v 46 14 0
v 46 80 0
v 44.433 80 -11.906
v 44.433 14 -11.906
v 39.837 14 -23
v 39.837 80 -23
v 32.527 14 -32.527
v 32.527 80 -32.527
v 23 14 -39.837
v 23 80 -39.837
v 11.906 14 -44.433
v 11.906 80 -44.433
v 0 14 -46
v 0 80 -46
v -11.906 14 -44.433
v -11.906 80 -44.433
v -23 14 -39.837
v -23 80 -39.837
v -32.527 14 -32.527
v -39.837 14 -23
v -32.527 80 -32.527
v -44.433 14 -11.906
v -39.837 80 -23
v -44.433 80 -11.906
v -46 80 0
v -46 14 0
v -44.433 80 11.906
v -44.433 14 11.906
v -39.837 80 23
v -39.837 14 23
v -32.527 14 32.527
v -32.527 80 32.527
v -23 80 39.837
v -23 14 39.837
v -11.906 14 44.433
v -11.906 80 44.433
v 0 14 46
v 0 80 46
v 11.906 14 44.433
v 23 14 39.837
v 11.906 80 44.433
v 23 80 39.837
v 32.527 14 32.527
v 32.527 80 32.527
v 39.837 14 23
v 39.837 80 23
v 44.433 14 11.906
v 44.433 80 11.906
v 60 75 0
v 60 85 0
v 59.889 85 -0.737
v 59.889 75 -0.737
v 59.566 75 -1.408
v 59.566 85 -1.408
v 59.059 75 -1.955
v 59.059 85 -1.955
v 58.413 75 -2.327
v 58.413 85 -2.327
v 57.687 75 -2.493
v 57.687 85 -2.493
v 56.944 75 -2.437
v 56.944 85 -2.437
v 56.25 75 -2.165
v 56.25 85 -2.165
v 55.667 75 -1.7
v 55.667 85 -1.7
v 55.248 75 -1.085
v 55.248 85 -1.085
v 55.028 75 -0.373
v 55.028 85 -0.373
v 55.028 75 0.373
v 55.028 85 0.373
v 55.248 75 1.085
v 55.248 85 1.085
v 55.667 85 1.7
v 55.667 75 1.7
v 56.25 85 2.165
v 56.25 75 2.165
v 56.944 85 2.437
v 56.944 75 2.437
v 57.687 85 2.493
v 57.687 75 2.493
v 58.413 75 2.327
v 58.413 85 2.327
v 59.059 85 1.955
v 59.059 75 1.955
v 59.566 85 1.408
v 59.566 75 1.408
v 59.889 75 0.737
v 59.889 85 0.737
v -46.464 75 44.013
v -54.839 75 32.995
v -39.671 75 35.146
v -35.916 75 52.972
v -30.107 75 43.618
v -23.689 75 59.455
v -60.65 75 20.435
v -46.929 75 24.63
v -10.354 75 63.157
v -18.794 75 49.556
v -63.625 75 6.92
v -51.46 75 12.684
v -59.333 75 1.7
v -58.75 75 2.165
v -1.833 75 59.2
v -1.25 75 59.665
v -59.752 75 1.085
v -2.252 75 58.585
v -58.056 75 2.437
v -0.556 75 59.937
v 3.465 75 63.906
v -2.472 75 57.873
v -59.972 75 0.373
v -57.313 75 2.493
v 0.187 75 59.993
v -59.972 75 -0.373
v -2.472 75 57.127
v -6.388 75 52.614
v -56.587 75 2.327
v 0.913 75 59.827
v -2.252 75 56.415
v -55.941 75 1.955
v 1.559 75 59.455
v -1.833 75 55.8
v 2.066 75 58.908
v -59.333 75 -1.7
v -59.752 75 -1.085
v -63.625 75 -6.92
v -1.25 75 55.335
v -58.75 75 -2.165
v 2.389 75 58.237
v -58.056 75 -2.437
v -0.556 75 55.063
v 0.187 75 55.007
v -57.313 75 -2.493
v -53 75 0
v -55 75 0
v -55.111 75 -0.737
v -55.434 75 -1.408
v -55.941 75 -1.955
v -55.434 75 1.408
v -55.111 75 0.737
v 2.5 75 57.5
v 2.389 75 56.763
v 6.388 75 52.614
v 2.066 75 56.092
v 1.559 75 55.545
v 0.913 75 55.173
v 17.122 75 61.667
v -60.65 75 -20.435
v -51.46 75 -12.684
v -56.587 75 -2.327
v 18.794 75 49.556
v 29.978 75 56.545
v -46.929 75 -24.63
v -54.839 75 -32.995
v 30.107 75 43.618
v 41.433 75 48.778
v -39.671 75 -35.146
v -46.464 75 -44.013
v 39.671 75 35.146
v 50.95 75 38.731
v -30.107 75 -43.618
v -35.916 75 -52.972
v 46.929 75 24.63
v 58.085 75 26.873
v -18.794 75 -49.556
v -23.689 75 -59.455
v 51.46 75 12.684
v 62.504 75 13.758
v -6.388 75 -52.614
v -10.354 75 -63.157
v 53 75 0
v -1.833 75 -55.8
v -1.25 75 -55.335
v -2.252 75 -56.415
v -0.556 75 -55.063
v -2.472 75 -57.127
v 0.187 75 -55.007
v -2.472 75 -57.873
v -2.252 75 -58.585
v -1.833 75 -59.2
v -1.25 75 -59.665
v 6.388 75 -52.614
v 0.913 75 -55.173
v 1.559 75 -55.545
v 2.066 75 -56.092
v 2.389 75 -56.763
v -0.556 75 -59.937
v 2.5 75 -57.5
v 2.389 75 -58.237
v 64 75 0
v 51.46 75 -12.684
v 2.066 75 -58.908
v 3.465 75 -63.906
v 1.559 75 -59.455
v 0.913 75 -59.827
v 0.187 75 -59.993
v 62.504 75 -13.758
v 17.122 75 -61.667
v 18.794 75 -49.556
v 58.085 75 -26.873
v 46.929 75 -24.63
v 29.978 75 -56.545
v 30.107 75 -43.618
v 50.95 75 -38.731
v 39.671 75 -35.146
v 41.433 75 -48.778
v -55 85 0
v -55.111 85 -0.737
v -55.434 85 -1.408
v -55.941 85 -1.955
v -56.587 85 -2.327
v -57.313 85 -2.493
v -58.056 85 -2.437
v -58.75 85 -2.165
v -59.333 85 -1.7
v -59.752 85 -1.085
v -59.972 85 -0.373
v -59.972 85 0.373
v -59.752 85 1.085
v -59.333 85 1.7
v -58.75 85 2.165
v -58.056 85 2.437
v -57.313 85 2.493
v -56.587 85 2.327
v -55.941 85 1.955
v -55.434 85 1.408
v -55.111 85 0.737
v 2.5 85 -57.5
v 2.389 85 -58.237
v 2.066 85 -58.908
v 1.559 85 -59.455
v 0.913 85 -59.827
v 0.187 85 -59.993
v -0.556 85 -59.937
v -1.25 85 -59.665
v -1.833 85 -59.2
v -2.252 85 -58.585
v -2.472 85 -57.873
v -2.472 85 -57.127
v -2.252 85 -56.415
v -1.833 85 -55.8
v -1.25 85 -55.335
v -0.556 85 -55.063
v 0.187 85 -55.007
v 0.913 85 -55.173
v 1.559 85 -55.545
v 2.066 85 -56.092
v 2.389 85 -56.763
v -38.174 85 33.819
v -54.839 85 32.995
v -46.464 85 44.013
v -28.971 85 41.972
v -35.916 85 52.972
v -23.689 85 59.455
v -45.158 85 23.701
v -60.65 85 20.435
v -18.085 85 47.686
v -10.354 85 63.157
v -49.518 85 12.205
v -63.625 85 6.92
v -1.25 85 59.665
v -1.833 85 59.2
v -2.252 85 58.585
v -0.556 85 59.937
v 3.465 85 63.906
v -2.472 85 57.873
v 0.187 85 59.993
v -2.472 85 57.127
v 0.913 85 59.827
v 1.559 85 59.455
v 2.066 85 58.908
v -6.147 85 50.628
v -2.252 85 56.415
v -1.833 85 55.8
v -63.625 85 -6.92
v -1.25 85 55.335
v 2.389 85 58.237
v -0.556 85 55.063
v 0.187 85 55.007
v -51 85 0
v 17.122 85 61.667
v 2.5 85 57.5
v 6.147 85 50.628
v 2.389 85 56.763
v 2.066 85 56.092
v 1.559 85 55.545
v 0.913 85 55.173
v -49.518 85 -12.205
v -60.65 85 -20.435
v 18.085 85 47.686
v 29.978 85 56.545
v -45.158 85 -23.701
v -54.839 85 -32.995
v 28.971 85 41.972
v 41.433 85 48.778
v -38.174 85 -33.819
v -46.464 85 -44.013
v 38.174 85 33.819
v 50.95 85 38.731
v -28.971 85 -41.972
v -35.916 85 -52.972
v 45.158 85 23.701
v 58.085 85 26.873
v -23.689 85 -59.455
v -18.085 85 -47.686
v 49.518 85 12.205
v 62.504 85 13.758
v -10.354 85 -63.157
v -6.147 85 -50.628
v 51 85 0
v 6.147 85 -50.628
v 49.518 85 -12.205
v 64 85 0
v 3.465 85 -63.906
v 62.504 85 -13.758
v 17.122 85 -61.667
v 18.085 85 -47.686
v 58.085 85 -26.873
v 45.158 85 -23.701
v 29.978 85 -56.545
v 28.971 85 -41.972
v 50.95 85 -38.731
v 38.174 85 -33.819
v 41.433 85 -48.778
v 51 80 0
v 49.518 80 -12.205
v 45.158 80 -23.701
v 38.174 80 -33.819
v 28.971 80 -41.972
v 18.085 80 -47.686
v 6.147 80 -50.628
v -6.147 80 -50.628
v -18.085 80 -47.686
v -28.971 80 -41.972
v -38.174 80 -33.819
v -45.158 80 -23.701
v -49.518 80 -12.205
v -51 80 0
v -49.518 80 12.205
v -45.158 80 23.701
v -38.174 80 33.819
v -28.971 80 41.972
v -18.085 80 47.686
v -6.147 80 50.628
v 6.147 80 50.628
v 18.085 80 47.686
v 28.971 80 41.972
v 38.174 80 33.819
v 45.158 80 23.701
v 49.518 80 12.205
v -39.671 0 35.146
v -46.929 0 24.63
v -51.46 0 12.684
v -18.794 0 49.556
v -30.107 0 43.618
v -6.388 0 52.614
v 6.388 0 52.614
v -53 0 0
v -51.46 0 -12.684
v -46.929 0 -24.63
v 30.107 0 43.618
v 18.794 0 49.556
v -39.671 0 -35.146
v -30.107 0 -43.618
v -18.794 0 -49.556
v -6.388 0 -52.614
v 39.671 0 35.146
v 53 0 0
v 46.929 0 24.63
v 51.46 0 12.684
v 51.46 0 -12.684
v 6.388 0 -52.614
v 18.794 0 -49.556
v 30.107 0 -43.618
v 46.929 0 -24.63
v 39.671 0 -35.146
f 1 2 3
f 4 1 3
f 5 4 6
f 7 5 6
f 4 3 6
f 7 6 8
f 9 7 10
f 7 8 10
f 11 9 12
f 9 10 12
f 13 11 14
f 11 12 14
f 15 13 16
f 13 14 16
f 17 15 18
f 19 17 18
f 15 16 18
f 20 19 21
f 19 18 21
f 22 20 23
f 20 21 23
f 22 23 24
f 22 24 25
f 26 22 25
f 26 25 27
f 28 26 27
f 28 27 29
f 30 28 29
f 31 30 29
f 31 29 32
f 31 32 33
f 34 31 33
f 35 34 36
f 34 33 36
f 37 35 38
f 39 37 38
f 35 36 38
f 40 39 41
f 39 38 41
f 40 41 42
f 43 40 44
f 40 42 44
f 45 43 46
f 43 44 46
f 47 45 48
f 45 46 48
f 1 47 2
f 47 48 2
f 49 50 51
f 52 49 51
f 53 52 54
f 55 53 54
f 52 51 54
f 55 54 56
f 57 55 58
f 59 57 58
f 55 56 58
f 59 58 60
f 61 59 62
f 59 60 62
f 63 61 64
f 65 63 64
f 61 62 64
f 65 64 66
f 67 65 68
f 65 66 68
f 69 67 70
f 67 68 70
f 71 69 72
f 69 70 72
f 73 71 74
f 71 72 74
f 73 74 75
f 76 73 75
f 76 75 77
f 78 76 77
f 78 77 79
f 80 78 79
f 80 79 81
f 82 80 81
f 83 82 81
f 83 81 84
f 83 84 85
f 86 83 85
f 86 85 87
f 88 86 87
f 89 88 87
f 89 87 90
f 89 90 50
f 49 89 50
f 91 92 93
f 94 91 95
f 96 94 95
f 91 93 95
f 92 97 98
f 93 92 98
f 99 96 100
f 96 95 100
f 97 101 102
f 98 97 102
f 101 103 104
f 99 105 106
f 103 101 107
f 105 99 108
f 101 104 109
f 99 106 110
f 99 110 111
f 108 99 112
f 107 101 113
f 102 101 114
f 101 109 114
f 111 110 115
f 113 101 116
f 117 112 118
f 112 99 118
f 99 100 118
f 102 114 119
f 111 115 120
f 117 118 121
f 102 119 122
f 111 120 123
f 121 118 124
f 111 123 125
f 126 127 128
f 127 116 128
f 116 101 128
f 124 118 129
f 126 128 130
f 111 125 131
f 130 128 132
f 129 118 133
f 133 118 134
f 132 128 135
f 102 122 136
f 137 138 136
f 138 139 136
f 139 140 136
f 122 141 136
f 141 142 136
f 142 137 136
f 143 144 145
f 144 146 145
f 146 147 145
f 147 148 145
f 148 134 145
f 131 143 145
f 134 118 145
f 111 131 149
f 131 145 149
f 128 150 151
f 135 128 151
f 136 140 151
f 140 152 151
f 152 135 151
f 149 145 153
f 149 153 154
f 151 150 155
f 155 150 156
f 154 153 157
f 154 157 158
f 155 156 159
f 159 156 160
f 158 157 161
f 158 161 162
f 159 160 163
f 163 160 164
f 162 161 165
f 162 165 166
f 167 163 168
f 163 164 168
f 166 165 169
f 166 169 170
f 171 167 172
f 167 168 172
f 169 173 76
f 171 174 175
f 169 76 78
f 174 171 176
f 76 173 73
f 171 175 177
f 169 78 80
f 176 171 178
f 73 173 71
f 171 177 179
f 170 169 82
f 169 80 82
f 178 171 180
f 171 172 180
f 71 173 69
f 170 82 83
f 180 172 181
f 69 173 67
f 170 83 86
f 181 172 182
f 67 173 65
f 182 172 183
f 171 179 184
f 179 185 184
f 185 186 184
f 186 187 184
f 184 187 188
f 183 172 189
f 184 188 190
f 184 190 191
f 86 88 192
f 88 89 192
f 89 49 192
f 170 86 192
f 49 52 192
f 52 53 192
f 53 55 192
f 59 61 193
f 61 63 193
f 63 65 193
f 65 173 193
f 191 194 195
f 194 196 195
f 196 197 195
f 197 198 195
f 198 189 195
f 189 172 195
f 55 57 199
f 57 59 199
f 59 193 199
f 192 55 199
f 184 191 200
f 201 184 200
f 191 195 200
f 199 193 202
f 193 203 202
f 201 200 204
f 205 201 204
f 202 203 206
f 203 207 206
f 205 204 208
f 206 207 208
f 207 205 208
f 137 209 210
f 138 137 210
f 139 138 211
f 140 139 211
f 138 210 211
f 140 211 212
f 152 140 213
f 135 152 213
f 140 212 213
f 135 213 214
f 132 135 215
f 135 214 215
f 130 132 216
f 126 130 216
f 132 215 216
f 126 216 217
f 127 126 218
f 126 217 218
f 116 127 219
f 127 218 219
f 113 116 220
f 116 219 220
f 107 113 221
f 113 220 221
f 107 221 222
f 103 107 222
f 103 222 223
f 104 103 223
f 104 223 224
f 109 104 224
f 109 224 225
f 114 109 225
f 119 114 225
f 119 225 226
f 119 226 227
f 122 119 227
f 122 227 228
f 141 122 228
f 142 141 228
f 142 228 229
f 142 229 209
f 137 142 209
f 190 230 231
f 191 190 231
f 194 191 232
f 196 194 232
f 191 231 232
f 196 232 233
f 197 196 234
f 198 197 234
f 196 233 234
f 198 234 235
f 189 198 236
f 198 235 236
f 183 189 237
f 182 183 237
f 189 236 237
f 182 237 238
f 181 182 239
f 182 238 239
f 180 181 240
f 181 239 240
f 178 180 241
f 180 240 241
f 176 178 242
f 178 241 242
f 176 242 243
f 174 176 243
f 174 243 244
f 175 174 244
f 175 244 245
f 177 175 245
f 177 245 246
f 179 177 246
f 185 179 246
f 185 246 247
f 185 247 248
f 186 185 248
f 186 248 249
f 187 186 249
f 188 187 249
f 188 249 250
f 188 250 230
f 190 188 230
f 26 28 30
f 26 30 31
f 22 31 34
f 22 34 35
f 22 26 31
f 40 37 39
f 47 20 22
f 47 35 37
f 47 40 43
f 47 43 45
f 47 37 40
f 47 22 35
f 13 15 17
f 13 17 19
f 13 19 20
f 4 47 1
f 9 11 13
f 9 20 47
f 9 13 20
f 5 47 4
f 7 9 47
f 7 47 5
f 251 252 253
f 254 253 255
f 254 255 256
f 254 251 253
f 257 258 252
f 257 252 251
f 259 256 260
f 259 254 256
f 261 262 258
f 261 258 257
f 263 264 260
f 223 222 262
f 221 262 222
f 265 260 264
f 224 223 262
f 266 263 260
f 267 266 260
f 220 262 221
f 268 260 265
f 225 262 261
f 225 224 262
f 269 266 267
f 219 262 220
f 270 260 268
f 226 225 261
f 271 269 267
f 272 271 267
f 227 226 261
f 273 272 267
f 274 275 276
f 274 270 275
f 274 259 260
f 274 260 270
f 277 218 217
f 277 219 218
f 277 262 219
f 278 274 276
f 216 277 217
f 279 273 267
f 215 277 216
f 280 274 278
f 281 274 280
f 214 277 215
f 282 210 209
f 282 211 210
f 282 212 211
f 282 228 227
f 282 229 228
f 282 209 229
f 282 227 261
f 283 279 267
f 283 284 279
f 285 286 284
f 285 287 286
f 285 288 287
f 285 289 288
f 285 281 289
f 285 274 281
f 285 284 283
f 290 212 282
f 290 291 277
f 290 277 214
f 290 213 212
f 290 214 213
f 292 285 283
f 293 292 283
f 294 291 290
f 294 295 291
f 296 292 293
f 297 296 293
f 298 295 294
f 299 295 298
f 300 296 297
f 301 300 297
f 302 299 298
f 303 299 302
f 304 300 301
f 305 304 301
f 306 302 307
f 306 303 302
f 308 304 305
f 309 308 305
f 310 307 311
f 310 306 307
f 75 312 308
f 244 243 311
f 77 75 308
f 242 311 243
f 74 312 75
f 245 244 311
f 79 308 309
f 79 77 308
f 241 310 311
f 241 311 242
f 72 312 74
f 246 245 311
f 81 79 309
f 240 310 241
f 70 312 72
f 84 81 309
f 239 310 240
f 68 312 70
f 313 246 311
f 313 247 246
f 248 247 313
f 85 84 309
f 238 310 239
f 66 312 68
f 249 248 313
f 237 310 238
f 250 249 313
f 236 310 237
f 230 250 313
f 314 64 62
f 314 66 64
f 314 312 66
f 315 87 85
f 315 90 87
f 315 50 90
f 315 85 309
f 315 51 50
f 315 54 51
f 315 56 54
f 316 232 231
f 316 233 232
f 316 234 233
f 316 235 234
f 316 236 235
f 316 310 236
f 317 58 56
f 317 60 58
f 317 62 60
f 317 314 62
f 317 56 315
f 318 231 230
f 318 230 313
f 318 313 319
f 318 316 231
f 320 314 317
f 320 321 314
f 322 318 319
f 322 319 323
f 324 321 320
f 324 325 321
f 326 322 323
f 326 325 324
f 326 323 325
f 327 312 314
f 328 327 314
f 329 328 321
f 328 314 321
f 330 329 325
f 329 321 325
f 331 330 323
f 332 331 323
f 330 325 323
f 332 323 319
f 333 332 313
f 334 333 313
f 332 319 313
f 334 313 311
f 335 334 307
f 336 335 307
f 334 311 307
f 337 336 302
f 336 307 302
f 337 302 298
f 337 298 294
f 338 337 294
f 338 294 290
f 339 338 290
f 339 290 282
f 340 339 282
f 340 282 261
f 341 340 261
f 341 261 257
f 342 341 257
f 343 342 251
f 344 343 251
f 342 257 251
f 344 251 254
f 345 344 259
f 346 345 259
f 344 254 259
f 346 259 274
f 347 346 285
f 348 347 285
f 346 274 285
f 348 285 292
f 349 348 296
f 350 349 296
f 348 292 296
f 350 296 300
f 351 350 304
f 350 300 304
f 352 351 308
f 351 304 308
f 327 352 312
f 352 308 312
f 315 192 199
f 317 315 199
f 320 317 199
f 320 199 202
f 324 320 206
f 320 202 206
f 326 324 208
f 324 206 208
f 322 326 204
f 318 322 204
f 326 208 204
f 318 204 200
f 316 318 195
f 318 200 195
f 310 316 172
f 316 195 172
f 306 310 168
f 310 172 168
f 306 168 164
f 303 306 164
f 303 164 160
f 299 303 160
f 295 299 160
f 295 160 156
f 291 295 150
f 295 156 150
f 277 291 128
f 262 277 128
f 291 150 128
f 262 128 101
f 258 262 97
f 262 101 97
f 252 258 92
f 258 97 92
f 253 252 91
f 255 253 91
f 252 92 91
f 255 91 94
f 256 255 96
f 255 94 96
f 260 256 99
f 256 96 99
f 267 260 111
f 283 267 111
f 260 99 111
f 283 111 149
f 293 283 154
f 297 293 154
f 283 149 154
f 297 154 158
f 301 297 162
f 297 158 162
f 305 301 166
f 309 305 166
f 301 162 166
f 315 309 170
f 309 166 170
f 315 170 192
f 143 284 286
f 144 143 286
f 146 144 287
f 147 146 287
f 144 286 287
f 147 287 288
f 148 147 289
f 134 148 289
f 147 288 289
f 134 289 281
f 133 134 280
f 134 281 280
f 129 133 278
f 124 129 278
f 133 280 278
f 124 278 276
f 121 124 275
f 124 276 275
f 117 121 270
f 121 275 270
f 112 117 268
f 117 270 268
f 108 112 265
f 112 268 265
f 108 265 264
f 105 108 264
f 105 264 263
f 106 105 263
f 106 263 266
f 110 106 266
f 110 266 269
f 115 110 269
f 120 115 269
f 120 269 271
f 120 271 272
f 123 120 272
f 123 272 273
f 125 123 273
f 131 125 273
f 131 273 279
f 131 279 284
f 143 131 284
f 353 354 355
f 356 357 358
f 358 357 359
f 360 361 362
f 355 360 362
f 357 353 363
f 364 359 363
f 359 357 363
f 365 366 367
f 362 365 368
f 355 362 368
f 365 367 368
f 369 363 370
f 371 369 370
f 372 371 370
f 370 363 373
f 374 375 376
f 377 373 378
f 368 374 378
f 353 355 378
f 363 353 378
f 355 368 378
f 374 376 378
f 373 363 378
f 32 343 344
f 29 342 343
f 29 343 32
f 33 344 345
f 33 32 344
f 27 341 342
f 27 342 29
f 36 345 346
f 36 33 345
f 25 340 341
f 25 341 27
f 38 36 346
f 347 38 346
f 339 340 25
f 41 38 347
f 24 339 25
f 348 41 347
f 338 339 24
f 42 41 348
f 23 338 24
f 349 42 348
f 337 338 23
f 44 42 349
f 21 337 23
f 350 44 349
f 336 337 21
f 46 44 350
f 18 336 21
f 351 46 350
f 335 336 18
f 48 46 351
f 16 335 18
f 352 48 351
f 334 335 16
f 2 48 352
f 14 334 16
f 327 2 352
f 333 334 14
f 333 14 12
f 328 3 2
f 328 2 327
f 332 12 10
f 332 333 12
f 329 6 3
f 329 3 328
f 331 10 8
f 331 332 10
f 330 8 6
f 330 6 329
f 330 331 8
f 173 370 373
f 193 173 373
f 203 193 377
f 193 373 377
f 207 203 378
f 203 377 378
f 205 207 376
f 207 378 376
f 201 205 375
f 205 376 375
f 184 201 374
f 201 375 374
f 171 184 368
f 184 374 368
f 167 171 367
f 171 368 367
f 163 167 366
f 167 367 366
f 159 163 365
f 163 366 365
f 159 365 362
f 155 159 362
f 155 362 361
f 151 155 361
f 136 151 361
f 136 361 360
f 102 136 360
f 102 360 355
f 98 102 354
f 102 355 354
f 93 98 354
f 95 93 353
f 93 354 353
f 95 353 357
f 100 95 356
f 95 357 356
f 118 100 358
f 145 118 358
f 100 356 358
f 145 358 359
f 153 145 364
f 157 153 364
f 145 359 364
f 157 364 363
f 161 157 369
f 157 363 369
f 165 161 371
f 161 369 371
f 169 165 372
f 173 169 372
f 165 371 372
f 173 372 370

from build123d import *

# Parameters (mm, degrees)
SKETCH1_R           = 53
BOSS_EXTRUDE1_DEPTH = 75
SKETCH2_R           = 64
BOSS_EXTRUDE2_DEPTH = 10
SKETCH3_R           = 51
CUT_EXTRUDE1_DEPTH  = 5
SKETCH5_R           = 46
CUT_EXTRUDE2_DEPTH  = 66
SKETCH6_R           = 2.5
CUT_EXTRUDE3_DEPTH  = 66


with BuildPart() as part:
    # Sketch1 → Boss-Extrude1 (new body)
    with BuildSketch(Plane(origin=(0, 0, 0), x_dir=(1, 0, 0), z_dir=(0, 1, 0))):
        Circle(SKETCH1_R)
    extrude(amount=BOSS_EXTRUDE1_DEPTH)

    # Sketch2 → Boss-Extrude2 (add)
    with BuildSketch(Plane(origin=(0, 75, 0), x_dir=(1, 0, 0), z_dir=(0, 1, 0))):
        Circle(SKETCH2_R)
    extrude(amount=BOSS_EXTRUDE2_DEPTH)

    # Sketch3 → Cut-Extrude1 (cut)
    with BuildSketch(Plane(origin=(0, 85, 0), x_dir=(1, 0, 0), z_dir=(0, 1, 0))):
        Circle(SKETCH3_R)
    extrude(amount=-CUT_EXTRUDE1_DEPTH, mode=Mode.SUBTRACT)

    # Sketch5 → Cut-Extrude2 (cut)
    with BuildSketch(Plane(origin=(0, 80, 0), x_dir=(1, 0, 0), z_dir=(0, 1, 0))):
        Circle(SKETCH5_R)
    extrude(amount=-CUT_EXTRUDE2_DEPTH, mode=Mode.SUBTRACT)

    # Sketch6 → Cut-Extrude3 (cut)
    with BuildSketch(Plane(origin=(0, 85, 0), x_dir=(1, 0, 0), z_dir=(0, 1, 0))):
        with Locations((-57.5, 0)):
            Circle(SKETCH6_R)
        with Locations((0, 57.5)):
            Circle(SKETCH6_R)
        with Locations((57.5, 0)):
            Circle(SKETCH6_R)
        with Locations((0, -57.5)):
            Circle(SKETCH6_R)
    extrude(amount=-CUT_EXTRUDE3_DEPTH, mode=Mode.SUBTRACT)


solid = part.part
